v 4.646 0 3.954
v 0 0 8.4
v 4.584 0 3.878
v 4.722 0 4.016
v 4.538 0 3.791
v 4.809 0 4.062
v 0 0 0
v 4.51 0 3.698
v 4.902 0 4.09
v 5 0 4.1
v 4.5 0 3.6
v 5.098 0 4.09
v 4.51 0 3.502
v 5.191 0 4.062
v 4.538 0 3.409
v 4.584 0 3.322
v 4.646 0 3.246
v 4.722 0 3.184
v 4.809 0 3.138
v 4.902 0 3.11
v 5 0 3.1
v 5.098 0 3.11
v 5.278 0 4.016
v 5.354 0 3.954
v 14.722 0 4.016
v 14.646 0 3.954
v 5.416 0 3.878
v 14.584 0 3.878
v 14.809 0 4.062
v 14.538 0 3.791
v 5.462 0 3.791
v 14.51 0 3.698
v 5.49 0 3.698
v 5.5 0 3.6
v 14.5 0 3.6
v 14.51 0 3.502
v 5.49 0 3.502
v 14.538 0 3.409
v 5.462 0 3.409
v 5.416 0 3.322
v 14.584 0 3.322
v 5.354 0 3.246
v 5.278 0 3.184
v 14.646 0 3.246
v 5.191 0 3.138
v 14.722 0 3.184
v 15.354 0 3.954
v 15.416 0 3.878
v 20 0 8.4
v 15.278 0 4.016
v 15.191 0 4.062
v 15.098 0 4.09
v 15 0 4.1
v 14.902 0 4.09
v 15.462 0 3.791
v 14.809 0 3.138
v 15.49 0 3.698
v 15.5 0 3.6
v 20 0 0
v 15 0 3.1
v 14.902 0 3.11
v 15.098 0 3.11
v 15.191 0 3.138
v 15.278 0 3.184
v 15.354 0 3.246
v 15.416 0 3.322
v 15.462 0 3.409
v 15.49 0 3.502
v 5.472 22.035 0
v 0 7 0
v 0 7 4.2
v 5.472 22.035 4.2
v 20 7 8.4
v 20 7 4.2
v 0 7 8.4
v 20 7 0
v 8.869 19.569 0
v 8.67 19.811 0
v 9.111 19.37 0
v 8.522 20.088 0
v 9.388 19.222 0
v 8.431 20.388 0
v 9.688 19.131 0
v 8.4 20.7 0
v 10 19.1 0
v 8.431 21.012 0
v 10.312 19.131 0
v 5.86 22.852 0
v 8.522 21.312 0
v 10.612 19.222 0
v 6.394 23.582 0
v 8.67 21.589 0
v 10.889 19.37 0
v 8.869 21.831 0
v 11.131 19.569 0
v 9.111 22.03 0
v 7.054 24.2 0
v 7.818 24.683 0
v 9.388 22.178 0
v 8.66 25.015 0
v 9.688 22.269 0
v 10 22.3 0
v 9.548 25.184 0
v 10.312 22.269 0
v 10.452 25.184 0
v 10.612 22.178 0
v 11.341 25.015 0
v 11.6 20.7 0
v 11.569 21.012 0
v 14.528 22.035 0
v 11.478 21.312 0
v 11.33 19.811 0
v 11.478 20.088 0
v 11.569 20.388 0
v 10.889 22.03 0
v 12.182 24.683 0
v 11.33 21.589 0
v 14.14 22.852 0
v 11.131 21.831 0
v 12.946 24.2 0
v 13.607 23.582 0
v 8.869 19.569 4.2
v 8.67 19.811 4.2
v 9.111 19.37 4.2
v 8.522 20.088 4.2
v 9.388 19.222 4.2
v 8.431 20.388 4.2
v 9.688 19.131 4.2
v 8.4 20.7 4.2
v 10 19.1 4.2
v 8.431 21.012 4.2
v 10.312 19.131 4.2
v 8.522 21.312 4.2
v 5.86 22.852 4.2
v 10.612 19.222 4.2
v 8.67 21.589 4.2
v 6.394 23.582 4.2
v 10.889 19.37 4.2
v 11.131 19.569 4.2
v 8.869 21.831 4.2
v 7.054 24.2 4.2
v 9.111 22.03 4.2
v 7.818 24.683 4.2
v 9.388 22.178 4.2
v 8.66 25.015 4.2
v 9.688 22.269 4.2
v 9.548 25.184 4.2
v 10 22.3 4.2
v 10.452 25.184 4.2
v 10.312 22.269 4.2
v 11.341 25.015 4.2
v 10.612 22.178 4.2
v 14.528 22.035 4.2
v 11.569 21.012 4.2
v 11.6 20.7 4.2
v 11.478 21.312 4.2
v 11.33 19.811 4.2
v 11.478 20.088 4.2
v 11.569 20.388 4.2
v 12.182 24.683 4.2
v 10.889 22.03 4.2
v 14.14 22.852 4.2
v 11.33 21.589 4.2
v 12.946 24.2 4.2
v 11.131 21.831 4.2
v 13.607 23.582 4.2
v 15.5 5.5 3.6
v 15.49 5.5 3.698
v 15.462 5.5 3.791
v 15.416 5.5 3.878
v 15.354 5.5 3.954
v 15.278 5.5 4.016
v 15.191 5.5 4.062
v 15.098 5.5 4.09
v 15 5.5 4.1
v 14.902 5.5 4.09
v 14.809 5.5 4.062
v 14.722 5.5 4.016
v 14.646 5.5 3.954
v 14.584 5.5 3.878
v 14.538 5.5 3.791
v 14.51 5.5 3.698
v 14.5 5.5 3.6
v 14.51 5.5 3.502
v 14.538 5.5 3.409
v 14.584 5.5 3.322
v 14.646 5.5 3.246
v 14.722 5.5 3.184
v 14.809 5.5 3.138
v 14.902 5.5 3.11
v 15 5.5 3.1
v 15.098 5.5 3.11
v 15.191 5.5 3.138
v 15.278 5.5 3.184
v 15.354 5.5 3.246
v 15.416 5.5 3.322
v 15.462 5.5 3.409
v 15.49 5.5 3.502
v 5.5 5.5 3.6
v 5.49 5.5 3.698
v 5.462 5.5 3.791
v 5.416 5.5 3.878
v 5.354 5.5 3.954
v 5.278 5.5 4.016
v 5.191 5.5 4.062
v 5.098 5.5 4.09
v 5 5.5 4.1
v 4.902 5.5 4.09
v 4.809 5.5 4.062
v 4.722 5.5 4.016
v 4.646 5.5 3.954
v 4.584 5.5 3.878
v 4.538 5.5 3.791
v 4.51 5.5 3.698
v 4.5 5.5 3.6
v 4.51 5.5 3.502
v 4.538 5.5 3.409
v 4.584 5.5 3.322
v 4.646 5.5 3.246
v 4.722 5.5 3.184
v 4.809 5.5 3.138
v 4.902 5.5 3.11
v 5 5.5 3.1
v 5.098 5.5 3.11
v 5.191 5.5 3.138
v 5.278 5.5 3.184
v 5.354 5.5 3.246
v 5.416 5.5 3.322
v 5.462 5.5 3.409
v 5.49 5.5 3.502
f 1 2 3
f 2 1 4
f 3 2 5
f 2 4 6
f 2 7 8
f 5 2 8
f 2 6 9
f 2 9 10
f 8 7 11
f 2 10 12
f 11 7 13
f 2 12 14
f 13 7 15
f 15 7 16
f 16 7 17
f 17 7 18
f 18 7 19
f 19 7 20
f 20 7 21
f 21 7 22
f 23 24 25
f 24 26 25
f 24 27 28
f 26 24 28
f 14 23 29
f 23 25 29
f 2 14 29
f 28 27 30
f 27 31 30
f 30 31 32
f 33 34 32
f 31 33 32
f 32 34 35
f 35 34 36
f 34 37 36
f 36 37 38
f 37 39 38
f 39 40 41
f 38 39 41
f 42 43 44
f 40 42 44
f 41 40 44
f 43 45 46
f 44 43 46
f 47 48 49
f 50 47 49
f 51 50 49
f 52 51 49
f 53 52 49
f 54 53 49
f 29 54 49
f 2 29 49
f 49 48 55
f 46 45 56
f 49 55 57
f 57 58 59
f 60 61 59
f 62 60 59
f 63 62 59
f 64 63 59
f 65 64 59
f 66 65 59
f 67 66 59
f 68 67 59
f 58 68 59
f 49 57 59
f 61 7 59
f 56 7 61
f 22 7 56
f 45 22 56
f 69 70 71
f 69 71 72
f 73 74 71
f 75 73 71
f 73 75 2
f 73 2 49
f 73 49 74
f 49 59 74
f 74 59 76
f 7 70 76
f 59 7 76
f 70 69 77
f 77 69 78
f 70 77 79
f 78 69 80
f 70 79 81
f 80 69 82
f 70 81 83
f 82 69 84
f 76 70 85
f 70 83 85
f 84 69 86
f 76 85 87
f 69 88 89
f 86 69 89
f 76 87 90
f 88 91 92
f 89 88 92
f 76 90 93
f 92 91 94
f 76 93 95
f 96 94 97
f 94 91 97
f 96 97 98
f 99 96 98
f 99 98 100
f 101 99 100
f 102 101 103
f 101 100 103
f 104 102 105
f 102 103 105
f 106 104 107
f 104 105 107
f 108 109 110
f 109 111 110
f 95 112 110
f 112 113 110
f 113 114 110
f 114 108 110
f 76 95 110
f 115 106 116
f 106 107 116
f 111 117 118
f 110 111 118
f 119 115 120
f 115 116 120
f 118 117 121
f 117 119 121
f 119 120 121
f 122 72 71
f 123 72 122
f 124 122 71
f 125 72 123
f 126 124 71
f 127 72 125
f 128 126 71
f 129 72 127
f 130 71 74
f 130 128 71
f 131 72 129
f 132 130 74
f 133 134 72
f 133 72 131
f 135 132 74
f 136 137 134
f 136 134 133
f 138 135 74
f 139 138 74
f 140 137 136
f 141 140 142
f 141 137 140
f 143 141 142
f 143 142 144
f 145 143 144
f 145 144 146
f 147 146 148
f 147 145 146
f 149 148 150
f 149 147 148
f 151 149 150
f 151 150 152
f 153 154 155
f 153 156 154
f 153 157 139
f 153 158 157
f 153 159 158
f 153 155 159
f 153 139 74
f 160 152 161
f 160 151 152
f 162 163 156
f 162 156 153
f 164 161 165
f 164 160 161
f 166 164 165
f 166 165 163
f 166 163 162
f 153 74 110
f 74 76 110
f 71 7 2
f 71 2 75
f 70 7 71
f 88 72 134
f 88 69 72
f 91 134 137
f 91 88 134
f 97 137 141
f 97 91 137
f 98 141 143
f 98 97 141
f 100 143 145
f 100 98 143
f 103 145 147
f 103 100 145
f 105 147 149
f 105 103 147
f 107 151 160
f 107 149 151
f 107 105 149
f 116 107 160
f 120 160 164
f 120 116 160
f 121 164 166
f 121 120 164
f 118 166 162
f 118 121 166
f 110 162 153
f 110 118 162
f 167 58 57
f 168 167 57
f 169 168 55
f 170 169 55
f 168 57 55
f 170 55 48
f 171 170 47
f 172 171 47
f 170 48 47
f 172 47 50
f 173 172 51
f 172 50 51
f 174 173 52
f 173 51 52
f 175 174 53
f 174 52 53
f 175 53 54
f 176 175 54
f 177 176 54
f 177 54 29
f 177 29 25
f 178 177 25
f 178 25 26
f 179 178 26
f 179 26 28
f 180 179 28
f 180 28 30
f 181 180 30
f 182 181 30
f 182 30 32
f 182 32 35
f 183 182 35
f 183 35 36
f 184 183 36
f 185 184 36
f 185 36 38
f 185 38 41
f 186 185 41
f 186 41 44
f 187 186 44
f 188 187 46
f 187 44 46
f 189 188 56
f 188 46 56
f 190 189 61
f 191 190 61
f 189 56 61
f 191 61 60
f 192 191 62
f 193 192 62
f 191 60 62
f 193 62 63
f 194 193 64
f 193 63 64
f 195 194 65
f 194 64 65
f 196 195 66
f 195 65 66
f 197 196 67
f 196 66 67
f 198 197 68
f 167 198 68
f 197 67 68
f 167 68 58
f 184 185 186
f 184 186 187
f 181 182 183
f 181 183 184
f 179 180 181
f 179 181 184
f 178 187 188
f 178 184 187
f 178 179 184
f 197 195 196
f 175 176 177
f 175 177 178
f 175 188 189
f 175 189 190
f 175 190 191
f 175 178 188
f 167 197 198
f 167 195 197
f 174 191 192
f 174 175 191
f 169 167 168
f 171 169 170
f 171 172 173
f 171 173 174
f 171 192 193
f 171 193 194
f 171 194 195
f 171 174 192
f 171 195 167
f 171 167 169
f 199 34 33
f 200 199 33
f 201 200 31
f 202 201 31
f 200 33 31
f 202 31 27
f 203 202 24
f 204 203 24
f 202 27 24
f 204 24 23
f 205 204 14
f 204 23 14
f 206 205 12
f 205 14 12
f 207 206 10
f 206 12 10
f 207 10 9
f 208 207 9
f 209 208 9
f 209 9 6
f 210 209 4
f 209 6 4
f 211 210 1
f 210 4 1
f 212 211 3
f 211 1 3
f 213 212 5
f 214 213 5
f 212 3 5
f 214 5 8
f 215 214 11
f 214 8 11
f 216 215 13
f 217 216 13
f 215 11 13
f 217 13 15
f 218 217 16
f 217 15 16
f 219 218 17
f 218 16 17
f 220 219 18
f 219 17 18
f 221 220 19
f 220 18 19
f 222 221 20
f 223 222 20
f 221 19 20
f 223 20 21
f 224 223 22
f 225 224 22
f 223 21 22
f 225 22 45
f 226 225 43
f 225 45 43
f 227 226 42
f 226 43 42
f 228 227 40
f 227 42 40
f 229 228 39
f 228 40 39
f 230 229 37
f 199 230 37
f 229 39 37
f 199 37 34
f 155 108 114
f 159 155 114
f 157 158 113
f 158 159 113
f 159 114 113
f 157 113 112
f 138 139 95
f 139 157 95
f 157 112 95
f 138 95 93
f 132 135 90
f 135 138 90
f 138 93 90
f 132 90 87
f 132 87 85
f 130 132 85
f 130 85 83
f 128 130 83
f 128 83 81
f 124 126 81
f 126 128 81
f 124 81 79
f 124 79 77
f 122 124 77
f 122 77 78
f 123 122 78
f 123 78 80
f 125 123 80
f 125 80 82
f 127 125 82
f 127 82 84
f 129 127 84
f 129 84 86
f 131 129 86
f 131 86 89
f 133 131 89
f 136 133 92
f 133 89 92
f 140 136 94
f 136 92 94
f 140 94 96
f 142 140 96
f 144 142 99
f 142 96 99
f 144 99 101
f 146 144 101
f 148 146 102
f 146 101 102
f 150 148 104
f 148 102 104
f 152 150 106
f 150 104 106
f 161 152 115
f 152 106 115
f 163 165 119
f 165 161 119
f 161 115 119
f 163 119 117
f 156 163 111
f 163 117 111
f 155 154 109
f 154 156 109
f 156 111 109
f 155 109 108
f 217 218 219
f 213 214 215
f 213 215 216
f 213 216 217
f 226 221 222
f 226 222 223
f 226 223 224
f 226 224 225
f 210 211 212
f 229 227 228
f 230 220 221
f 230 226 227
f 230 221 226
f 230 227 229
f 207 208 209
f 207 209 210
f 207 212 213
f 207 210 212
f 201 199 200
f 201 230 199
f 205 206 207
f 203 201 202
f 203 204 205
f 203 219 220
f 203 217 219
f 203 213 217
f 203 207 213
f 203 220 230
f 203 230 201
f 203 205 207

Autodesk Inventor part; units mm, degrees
ref_plane "YZ Plane" through (0, 0, 0) normal (1, 0, 0) x (0, 1, 0)
ref_plane "XZ Plane" through (0, 0, 0) normal (0, 1, 0) x (-1, 0, 0)
ref_plane "XY Plane" through (0, 0, 0) normal (0, 0, 1) x (1, 0, 0)
sketch "Sketch1" plane through (0, 0, 0) normal (0, 0, 1) x (1, 0, 0)
  circle A0 centre (10, 20.7) radius 1.6
  line L0 (0, 0) -> (20.0001, 0)
  line L1 (0, 0) -> (0, 7)
  line L2 (20.0001, 0) -> (20.0001, 6.9998)
  line L3 (0, 7) -> (5.4723, 22.0351)
  line L4 (0, 7) -> (16, 7) construction
  line L5 (20.0001, 6.9998) -> (14.5277, 22.0349)
  line L6 (20.0001, 6.9998) -> (36.0001, 6.9998) construction
  arc A1 (14.5277, 22.0349) -> (5.4723, 22.0351) centre (10, 20.3869) ccw
  dimension "d17" = 7
  dimension "d18" = 6.9998
  dimension "d19" = 20.7
  dimension "d23" = 90
  dimension "d24" = 90
  dimension "d25" = 10
  dimension "d26" = 16
  dimension "d27" = 70
  dimension "d28" = 16
  dimension "d29" = 110
  dimension "d30" = 10
sketch "Sketch3" plane through (0, 0, 0) normal (0, 0, 1) x (1, 0, 0)
  point P0 (0, 0)
extrude "Extrusion1" add sketch "Sketch1" along normal blind 4.2
sketch "Sketch4" plane through (0, 0, 4.2) normal (0, 0, 1) x (1, 0, 0)
  line L0 (0, 7) -> (0, 0) projected
  line L1 (20.0001, 0) -> (20.0001, 6.9998) projected
  line L2 (0, 0) -> (20.0001, 0)
  line L3 (20.0001, 0) -> (20.0001, 6.9998)
  line L4 (3.884, 22.9404) -> (-0.0481, 7.0119) projected
  line L5 (20.0001, 6.9998) -> (0, 6.9998)
  line L6 (0, 7) -> (0, 0)
extrude "Extrusion2" add sketch "Sketch4" along normal blind 4.2
sketch "Sketch5" plane through (0, 0, 0) normal (0, -1, 0) x (1, 0, 0)
  circle A0 centre (5, 3.6) radius 0.5
  circle A1 centre (15, 3.6) radius 0.5
  line L0 (0, 0) -> (20.0001, 0) projected
  line L1 (0, 8.4) -> (20.0001, 8.4) projected
  dimension "d13" = 1
  dimension "d14" = 1
  dimension "d33" = 4.8
  dimension "d34" = 4.8
extrude "Extrusion3" cut sketch "Sketch5" against normal blind 5.5
properties part number "upper_deck_shaft_mount_v3"
